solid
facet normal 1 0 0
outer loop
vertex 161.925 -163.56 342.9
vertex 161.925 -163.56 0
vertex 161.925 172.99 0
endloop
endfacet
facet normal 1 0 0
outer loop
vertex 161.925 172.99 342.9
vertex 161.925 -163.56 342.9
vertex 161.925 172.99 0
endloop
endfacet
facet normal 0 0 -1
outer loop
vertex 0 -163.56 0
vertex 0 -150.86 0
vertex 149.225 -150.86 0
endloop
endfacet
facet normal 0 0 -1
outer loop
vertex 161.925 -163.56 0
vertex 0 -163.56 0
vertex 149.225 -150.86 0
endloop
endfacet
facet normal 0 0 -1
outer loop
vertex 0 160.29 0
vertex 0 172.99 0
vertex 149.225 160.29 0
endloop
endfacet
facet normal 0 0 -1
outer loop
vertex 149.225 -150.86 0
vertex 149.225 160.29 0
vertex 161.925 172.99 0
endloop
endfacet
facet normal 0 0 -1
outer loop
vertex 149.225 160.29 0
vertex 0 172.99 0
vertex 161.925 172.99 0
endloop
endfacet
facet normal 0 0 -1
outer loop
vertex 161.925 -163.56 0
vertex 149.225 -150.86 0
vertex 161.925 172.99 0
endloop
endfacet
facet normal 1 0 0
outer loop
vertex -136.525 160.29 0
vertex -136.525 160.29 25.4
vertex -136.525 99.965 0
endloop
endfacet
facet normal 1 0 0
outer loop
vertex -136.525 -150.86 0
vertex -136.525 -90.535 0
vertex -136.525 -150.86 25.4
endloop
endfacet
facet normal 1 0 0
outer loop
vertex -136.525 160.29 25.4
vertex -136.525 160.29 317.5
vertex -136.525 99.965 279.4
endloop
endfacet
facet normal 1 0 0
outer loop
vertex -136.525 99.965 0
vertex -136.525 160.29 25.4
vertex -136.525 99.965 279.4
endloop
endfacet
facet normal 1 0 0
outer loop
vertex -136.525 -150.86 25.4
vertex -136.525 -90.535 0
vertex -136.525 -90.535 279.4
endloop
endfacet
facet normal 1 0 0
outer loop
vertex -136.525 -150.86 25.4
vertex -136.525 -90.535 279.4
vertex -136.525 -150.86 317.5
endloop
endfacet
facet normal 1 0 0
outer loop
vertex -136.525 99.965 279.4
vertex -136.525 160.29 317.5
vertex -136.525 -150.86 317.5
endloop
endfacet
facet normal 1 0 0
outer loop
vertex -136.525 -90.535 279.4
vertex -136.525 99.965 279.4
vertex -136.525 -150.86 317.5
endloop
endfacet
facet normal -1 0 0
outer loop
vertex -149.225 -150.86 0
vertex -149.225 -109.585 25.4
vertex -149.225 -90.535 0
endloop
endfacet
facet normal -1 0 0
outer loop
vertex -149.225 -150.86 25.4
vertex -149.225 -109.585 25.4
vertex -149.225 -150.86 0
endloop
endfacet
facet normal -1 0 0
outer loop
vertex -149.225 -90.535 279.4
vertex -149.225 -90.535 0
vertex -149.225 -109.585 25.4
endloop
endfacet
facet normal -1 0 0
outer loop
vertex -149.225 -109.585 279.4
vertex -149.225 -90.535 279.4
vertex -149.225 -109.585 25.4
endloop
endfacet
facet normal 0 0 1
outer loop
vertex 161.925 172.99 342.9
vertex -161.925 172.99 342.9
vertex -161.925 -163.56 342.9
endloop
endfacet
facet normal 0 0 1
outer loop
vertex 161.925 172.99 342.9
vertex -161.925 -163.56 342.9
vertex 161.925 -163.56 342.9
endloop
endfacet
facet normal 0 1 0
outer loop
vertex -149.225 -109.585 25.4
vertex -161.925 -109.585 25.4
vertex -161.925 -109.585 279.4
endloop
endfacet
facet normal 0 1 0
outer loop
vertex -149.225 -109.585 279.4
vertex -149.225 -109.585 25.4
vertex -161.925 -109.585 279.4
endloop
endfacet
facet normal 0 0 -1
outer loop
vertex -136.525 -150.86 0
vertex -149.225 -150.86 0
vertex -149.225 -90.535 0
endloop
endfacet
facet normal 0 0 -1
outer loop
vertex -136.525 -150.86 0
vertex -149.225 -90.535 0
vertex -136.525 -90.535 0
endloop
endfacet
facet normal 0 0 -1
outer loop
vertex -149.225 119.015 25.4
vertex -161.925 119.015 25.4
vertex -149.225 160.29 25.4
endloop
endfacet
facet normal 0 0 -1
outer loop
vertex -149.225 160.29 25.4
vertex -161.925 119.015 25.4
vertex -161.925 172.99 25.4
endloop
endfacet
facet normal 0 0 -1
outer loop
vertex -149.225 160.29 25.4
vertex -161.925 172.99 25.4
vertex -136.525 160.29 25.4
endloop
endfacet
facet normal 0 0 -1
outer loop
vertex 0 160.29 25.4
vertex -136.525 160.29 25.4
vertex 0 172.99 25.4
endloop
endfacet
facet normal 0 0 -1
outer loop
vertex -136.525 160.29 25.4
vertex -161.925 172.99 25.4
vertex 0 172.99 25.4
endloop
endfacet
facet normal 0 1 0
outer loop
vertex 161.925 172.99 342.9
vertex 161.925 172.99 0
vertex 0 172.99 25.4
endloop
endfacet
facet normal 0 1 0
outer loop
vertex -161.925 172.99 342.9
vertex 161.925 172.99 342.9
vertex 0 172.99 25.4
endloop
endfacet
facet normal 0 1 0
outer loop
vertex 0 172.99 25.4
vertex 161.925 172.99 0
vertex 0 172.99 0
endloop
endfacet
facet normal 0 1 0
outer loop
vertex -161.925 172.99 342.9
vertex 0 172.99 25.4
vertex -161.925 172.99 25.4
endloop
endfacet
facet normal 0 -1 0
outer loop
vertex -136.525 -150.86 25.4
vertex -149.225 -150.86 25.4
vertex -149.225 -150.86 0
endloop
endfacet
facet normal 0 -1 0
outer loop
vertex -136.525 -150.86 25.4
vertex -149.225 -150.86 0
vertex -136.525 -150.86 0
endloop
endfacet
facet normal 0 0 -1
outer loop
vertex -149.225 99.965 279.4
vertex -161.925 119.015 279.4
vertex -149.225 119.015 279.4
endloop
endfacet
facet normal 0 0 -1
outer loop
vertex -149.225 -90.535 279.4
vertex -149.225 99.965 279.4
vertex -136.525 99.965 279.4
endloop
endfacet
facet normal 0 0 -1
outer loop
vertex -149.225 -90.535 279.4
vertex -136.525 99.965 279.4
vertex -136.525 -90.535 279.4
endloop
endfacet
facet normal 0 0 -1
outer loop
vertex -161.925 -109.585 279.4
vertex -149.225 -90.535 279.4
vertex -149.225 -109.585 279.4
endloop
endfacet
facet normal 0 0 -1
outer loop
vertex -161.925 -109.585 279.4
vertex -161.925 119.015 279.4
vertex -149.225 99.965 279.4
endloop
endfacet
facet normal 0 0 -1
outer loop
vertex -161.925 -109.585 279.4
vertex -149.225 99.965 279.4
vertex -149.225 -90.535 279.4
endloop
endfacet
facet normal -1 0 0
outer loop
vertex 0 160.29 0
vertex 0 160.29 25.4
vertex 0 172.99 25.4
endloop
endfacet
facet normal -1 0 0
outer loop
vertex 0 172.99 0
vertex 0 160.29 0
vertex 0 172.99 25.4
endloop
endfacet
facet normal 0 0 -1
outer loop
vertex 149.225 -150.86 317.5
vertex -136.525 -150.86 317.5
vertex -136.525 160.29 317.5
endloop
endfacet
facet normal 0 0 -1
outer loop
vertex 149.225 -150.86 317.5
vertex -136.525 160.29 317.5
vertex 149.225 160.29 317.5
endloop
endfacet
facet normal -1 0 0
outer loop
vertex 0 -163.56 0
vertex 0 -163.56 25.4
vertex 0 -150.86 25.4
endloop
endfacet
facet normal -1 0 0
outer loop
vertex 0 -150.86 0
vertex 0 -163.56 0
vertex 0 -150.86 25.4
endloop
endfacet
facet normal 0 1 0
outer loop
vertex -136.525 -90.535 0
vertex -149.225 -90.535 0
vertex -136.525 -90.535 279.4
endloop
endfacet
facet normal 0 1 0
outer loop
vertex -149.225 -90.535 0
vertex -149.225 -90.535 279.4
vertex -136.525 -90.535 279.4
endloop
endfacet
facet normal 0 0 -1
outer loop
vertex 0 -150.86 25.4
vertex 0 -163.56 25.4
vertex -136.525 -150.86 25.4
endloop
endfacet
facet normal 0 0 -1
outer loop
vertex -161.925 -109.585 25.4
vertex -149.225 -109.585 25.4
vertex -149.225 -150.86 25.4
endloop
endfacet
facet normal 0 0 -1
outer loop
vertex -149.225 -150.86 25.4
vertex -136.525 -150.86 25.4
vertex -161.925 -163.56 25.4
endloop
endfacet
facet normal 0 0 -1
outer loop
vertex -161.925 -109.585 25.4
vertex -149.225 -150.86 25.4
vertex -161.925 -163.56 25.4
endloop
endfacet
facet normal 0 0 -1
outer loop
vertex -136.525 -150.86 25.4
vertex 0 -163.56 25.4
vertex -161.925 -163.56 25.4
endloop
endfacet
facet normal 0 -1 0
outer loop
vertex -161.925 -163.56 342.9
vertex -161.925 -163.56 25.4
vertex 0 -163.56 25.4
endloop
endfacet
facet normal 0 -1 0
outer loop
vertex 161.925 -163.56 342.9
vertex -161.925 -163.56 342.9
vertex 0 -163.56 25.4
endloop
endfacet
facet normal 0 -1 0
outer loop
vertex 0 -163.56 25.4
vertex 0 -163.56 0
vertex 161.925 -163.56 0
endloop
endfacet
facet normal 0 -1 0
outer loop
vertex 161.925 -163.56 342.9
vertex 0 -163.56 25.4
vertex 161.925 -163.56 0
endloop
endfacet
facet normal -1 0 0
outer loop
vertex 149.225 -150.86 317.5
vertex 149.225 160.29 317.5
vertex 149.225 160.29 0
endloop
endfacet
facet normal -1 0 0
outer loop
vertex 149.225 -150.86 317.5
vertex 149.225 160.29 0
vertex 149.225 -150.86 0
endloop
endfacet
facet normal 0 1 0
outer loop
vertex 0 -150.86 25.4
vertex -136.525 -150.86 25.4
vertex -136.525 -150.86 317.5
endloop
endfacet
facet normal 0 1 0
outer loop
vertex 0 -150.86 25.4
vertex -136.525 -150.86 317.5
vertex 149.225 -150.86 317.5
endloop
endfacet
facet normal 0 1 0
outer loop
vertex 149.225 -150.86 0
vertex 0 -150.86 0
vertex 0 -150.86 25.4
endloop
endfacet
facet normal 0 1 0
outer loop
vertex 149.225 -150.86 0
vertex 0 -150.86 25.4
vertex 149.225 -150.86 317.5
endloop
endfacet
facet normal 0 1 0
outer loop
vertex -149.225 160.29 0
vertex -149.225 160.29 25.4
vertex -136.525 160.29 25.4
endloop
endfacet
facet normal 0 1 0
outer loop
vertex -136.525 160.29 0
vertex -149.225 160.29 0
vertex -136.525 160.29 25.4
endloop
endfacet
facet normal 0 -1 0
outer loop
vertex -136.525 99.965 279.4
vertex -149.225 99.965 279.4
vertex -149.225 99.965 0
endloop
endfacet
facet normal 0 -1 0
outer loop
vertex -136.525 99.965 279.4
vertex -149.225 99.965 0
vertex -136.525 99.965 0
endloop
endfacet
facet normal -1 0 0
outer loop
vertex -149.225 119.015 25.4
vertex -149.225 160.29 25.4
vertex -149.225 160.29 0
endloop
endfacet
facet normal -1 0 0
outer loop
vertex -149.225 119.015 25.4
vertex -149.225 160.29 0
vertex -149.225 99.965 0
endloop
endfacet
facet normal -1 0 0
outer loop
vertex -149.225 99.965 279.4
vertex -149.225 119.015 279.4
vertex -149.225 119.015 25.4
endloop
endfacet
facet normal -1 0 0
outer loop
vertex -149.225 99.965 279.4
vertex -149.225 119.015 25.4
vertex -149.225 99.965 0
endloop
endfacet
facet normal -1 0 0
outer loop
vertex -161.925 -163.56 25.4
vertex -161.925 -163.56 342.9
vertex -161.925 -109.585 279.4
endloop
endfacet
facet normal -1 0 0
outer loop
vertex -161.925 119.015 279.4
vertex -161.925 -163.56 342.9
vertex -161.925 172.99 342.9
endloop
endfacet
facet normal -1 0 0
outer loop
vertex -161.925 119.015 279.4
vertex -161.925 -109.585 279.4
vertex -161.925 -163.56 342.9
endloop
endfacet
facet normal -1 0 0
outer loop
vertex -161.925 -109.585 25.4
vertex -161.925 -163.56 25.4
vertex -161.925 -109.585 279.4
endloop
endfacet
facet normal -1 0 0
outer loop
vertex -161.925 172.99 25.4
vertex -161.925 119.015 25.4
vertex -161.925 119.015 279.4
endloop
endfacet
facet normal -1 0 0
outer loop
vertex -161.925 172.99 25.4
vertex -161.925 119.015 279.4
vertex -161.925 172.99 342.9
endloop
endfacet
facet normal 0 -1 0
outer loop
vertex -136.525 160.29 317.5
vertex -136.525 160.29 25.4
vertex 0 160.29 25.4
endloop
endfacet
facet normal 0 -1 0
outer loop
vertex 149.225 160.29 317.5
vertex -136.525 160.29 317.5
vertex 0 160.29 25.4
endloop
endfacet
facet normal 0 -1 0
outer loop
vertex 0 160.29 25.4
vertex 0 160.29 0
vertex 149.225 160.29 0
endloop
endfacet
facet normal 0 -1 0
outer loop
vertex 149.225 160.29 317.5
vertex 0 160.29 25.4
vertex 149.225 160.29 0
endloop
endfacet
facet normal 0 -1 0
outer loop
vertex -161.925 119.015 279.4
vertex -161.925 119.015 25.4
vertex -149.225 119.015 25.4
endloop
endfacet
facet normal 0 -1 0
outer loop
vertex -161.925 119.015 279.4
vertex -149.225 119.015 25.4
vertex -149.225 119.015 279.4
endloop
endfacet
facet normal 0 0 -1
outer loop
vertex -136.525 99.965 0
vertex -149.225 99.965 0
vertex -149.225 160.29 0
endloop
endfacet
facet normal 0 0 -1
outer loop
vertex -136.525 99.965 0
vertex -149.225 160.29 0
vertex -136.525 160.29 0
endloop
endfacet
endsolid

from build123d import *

# Parameters (mm, degrees)
F0_W      = 161.925
F0_H      = 336.55
F1_DEPTH  = 342.9
F2_W      = 285.75
F2_H      = 311.15
F3_DEPTH  = 317.5
F4_W      = 165.1
F4_H      = 222.25
F5_DEPTH  = 50.8
F6_W      = 228.6
F6_H      = 279.4
F7_DEPTH  = 76.2
F8_W      = 355.6
F8_H      = 25.4
F9_DEPTH  = 203.2
F10_W     = 12.7
F10_H     = 254
F12_DEPTH = 19.05
F13_W     = 12.7
F13_H     = 254
F14_DEPTH = 19.05
F15_W     = 12.7
F15_H     = 60.325
F16_DEPTH = 25.4
F17_W     = 12.7
F17_H     = 60.325
F18_DEPTH = 25.4


with BuildPart() as f1:
    # F0 (on Top) → F1 (new body)
    with BuildSketch(Plane.XY):
        with Locations((-80.9625, 4.714677)):
            Rectangle(F0_W, F0_H)
        with Locations((80.9625, 4.714677)):
            Rectangle(F0_W, F0_H)
    extrude(amount=F1_DEPTH)

    # F2 (on face) → F3 (cut)
    with BuildSketch(Plane(origin=(0, 0, 0), x_dir=(1, 0, 0), z_dir=(0, 0, -1))):
        with Locations((6.35, -4.714677)):
            Rectangle(F2_W, F2_H)
    extrude(amount=-F3_DEPTH, mode=Mode.SUBTRACT)

    # F4 (on face) → F5 (cut)
    with BuildSketch(Plane(origin=(-161.925, 0, 0), x_dir=(0, -1, 0), z_dir=(-1, 0, 0))):
        with Locations((-4.714677, 111.125)):
            Rectangle(F4_W, F4_H)
    extrude(amount=-F5_DEPTH, mode=Mode.SUBTRACT)

    # F6 (on face) → F7 (cut)
    with BuildSketch(Plane(origin=(-161.925, 0, 0), x_dir=(0, -1, 0), z_dir=(-1, 0, 0))):
        with Locations((-4.714677, 139.7)):
            Rectangle(F6_W, F6_H)
    extrude(amount=-F7_DEPTH, mode=Mode.SUBTRACT)

    # F8 (on Right) → F9 (cut)
    with BuildSketch(Plane.YZ):
        with Locations((5.509312, 12.7)):
            Rectangle(F8_W, F8_H)
    extrude(amount=-F9_DEPTH, mode=Mode.SUBTRACT)

    # F10 (on face) → F12 (join)
    with BuildSketch(Plane.XZ.offset(-119.014677)):
        with Locations((-142.875, 152.4)):
            Rectangle(F10_W, F10_H)
    extrude(amount=F12_DEPTH)

    # F13 (on face) → F14 (join)
    with BuildSketch(Plane(origin=(0, -109.585323, 0), x_dir=(-1, 0, 0), z_dir=(0, 1, 0))):
        with Locations((142.875, 152.4)):
            Rectangle(F13_W, F13_H)
    extrude(amount=F14_DEPTH)

    # F15 (on face) → F16 (join)
    with BuildSketch(Plane(origin=(0, 0, 25.4), x_dir=(1, 0, 0), z_dir=(0, 0, -1))):
        with Locations((-142.875, 120.697823)):
            Rectangle(F15_W, F15_H)
    extrude(amount=F16_DEPTH)

    # F17 (on face) → F18 (join)
    with BuildSketch(Plane(origin=(0, 0, 25.4), x_dir=(1, 0, 0), z_dir=(0, 0, -1))):
        with Locations((-142.875, -130.127177)):
            Rectangle(F17_W, F17_H)
    extrude(amount=F18_DEPTH)


solid = f1.part
